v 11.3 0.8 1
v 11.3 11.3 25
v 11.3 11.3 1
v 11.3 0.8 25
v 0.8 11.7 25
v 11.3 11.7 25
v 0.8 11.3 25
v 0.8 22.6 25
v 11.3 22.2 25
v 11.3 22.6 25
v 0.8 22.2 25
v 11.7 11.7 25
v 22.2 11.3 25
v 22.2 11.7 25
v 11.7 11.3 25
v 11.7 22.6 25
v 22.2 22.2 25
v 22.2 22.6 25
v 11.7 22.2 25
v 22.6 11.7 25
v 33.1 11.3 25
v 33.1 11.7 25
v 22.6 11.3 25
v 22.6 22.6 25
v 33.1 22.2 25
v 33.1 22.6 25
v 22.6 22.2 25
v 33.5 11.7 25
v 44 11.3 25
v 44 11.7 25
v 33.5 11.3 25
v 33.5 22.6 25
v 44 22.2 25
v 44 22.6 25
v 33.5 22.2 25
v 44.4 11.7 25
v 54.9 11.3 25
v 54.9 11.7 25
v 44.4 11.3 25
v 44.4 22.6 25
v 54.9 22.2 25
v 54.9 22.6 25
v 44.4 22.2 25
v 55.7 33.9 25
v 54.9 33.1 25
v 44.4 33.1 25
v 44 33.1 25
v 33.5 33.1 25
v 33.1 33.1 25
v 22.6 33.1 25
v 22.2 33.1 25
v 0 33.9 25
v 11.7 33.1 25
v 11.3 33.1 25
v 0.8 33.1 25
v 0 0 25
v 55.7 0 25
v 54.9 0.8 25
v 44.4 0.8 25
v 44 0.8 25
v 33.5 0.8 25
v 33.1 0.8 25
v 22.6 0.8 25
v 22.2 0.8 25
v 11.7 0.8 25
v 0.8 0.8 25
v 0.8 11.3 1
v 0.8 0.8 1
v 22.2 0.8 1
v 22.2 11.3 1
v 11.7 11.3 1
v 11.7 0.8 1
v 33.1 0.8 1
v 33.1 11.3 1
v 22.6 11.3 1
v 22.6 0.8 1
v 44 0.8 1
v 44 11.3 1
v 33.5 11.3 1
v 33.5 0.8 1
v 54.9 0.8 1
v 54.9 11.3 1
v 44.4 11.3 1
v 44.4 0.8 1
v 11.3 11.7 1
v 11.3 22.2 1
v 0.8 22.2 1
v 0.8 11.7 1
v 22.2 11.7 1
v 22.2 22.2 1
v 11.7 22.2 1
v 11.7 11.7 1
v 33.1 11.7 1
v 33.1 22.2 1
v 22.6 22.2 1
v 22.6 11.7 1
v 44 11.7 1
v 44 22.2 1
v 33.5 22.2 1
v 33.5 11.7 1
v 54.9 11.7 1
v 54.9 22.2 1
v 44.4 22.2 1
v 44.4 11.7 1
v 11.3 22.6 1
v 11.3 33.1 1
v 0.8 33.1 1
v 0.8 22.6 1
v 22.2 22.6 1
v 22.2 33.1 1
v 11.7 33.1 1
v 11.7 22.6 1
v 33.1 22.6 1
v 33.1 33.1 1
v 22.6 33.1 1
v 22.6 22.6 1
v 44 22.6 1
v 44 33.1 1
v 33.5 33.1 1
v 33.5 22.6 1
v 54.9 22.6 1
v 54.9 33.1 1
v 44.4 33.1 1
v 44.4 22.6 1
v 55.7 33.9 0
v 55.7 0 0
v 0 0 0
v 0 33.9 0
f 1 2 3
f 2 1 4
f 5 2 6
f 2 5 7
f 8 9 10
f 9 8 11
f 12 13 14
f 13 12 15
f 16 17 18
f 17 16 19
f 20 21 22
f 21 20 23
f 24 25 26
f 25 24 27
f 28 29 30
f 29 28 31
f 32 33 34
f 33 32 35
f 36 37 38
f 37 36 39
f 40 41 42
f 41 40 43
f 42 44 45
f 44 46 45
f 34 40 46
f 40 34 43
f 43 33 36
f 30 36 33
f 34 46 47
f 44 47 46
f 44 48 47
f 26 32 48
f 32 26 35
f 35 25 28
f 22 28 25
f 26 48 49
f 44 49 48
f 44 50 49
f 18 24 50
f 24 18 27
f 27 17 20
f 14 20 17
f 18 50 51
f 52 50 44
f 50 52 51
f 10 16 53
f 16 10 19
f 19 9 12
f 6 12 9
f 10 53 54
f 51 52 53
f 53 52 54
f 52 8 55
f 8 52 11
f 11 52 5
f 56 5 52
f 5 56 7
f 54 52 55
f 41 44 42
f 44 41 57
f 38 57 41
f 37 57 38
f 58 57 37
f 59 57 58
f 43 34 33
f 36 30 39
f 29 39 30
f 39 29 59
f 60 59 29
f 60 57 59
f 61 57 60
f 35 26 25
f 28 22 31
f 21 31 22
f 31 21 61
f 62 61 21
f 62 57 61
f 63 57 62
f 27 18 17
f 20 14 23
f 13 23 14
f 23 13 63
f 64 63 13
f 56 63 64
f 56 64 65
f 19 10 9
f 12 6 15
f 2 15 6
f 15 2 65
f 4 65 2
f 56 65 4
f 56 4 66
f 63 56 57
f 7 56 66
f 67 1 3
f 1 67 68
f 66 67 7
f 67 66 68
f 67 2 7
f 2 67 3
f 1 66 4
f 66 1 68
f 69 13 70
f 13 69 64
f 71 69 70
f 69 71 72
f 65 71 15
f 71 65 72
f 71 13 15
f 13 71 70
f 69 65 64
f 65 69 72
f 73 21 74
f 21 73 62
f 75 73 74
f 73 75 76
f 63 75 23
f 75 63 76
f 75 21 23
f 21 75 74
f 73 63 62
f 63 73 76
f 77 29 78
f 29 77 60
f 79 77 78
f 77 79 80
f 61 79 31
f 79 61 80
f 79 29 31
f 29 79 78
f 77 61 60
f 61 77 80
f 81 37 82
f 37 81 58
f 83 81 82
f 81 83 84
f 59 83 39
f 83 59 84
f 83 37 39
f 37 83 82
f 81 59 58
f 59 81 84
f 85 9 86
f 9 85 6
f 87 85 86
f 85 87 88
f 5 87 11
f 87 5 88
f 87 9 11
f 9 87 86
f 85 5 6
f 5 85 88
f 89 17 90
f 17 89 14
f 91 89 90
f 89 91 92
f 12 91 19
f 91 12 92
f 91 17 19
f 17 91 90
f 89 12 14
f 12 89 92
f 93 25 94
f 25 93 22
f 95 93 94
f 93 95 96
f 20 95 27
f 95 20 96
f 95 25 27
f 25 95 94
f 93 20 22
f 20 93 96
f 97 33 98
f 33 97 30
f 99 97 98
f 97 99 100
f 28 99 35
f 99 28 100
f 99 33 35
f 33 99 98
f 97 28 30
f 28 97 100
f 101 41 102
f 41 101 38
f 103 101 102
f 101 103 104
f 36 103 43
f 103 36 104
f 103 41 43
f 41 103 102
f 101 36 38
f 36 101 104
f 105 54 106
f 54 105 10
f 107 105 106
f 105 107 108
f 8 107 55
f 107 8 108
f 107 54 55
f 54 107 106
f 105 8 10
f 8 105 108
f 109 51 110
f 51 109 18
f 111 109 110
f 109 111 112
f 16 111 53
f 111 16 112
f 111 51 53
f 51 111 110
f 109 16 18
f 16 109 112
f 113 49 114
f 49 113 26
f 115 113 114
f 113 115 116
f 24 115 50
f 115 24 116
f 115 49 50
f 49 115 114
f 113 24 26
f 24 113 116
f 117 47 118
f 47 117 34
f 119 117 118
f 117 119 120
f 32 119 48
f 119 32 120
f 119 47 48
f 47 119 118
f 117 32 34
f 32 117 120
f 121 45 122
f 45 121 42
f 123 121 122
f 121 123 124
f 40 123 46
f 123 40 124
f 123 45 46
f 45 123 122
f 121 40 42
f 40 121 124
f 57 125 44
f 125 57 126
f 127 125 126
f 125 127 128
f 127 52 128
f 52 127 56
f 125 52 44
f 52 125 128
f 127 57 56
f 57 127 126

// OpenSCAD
//
// Cubby Holes
//

//Number of columns
number_of_cols = 5;
//Number of rows
number_of_rows = 3;
nbr_cols1 = number_of_cols - 1;
nbr_rows1 = number_of_rows - 1;

//Width of cubby hole (mm)
cubby_hole_width = 10.5;
//Depth of cubby hole (mm)
cubby_hole_depth = 10.5;
//Height of cubby hole (mm)
cubby_hole_height = 24;

//Thickness of outer walls (mm)
outer_wall_thickness = .8;
//Thickness of inner walls (mm)
inner_wall_thickness = .4;
//Thickness of bottom (mm)
bottom_thickness = 1;

outer_x = outer_wall_thickness + (number_of_cols * cubby_hole_width) + (nbr_cols1 * inner_wall_thickness) + outer_wall_thickness;
outer_y = outer_wall_thickness + (number_of_rows * cubby_hole_depth) + (nbr_rows1 * inner_wall_thickness) + outer_wall_thickness;
outer_z = bottom_thickness + cubby_hole_height;

module holder(){
	difference() {
		cube([outer_x, outer_y, outer_z]);
		for( row = [0 : nbr_rows1] ){
			translate([0, (row * (cubby_hole_depth + inner_wall_thickness)), 0])
			for( col = [0 : nbr_cols1] ){
				translate([outer_wall_thickness + (col * (cubby_hole_width + inner_wall_thickness)), outer_wall_thickness, bottom_thickness]) cube([cubby_hole_width, cubby_hole_depth, cubby_hole_height]);
			}
		}
	}
}

holder();
